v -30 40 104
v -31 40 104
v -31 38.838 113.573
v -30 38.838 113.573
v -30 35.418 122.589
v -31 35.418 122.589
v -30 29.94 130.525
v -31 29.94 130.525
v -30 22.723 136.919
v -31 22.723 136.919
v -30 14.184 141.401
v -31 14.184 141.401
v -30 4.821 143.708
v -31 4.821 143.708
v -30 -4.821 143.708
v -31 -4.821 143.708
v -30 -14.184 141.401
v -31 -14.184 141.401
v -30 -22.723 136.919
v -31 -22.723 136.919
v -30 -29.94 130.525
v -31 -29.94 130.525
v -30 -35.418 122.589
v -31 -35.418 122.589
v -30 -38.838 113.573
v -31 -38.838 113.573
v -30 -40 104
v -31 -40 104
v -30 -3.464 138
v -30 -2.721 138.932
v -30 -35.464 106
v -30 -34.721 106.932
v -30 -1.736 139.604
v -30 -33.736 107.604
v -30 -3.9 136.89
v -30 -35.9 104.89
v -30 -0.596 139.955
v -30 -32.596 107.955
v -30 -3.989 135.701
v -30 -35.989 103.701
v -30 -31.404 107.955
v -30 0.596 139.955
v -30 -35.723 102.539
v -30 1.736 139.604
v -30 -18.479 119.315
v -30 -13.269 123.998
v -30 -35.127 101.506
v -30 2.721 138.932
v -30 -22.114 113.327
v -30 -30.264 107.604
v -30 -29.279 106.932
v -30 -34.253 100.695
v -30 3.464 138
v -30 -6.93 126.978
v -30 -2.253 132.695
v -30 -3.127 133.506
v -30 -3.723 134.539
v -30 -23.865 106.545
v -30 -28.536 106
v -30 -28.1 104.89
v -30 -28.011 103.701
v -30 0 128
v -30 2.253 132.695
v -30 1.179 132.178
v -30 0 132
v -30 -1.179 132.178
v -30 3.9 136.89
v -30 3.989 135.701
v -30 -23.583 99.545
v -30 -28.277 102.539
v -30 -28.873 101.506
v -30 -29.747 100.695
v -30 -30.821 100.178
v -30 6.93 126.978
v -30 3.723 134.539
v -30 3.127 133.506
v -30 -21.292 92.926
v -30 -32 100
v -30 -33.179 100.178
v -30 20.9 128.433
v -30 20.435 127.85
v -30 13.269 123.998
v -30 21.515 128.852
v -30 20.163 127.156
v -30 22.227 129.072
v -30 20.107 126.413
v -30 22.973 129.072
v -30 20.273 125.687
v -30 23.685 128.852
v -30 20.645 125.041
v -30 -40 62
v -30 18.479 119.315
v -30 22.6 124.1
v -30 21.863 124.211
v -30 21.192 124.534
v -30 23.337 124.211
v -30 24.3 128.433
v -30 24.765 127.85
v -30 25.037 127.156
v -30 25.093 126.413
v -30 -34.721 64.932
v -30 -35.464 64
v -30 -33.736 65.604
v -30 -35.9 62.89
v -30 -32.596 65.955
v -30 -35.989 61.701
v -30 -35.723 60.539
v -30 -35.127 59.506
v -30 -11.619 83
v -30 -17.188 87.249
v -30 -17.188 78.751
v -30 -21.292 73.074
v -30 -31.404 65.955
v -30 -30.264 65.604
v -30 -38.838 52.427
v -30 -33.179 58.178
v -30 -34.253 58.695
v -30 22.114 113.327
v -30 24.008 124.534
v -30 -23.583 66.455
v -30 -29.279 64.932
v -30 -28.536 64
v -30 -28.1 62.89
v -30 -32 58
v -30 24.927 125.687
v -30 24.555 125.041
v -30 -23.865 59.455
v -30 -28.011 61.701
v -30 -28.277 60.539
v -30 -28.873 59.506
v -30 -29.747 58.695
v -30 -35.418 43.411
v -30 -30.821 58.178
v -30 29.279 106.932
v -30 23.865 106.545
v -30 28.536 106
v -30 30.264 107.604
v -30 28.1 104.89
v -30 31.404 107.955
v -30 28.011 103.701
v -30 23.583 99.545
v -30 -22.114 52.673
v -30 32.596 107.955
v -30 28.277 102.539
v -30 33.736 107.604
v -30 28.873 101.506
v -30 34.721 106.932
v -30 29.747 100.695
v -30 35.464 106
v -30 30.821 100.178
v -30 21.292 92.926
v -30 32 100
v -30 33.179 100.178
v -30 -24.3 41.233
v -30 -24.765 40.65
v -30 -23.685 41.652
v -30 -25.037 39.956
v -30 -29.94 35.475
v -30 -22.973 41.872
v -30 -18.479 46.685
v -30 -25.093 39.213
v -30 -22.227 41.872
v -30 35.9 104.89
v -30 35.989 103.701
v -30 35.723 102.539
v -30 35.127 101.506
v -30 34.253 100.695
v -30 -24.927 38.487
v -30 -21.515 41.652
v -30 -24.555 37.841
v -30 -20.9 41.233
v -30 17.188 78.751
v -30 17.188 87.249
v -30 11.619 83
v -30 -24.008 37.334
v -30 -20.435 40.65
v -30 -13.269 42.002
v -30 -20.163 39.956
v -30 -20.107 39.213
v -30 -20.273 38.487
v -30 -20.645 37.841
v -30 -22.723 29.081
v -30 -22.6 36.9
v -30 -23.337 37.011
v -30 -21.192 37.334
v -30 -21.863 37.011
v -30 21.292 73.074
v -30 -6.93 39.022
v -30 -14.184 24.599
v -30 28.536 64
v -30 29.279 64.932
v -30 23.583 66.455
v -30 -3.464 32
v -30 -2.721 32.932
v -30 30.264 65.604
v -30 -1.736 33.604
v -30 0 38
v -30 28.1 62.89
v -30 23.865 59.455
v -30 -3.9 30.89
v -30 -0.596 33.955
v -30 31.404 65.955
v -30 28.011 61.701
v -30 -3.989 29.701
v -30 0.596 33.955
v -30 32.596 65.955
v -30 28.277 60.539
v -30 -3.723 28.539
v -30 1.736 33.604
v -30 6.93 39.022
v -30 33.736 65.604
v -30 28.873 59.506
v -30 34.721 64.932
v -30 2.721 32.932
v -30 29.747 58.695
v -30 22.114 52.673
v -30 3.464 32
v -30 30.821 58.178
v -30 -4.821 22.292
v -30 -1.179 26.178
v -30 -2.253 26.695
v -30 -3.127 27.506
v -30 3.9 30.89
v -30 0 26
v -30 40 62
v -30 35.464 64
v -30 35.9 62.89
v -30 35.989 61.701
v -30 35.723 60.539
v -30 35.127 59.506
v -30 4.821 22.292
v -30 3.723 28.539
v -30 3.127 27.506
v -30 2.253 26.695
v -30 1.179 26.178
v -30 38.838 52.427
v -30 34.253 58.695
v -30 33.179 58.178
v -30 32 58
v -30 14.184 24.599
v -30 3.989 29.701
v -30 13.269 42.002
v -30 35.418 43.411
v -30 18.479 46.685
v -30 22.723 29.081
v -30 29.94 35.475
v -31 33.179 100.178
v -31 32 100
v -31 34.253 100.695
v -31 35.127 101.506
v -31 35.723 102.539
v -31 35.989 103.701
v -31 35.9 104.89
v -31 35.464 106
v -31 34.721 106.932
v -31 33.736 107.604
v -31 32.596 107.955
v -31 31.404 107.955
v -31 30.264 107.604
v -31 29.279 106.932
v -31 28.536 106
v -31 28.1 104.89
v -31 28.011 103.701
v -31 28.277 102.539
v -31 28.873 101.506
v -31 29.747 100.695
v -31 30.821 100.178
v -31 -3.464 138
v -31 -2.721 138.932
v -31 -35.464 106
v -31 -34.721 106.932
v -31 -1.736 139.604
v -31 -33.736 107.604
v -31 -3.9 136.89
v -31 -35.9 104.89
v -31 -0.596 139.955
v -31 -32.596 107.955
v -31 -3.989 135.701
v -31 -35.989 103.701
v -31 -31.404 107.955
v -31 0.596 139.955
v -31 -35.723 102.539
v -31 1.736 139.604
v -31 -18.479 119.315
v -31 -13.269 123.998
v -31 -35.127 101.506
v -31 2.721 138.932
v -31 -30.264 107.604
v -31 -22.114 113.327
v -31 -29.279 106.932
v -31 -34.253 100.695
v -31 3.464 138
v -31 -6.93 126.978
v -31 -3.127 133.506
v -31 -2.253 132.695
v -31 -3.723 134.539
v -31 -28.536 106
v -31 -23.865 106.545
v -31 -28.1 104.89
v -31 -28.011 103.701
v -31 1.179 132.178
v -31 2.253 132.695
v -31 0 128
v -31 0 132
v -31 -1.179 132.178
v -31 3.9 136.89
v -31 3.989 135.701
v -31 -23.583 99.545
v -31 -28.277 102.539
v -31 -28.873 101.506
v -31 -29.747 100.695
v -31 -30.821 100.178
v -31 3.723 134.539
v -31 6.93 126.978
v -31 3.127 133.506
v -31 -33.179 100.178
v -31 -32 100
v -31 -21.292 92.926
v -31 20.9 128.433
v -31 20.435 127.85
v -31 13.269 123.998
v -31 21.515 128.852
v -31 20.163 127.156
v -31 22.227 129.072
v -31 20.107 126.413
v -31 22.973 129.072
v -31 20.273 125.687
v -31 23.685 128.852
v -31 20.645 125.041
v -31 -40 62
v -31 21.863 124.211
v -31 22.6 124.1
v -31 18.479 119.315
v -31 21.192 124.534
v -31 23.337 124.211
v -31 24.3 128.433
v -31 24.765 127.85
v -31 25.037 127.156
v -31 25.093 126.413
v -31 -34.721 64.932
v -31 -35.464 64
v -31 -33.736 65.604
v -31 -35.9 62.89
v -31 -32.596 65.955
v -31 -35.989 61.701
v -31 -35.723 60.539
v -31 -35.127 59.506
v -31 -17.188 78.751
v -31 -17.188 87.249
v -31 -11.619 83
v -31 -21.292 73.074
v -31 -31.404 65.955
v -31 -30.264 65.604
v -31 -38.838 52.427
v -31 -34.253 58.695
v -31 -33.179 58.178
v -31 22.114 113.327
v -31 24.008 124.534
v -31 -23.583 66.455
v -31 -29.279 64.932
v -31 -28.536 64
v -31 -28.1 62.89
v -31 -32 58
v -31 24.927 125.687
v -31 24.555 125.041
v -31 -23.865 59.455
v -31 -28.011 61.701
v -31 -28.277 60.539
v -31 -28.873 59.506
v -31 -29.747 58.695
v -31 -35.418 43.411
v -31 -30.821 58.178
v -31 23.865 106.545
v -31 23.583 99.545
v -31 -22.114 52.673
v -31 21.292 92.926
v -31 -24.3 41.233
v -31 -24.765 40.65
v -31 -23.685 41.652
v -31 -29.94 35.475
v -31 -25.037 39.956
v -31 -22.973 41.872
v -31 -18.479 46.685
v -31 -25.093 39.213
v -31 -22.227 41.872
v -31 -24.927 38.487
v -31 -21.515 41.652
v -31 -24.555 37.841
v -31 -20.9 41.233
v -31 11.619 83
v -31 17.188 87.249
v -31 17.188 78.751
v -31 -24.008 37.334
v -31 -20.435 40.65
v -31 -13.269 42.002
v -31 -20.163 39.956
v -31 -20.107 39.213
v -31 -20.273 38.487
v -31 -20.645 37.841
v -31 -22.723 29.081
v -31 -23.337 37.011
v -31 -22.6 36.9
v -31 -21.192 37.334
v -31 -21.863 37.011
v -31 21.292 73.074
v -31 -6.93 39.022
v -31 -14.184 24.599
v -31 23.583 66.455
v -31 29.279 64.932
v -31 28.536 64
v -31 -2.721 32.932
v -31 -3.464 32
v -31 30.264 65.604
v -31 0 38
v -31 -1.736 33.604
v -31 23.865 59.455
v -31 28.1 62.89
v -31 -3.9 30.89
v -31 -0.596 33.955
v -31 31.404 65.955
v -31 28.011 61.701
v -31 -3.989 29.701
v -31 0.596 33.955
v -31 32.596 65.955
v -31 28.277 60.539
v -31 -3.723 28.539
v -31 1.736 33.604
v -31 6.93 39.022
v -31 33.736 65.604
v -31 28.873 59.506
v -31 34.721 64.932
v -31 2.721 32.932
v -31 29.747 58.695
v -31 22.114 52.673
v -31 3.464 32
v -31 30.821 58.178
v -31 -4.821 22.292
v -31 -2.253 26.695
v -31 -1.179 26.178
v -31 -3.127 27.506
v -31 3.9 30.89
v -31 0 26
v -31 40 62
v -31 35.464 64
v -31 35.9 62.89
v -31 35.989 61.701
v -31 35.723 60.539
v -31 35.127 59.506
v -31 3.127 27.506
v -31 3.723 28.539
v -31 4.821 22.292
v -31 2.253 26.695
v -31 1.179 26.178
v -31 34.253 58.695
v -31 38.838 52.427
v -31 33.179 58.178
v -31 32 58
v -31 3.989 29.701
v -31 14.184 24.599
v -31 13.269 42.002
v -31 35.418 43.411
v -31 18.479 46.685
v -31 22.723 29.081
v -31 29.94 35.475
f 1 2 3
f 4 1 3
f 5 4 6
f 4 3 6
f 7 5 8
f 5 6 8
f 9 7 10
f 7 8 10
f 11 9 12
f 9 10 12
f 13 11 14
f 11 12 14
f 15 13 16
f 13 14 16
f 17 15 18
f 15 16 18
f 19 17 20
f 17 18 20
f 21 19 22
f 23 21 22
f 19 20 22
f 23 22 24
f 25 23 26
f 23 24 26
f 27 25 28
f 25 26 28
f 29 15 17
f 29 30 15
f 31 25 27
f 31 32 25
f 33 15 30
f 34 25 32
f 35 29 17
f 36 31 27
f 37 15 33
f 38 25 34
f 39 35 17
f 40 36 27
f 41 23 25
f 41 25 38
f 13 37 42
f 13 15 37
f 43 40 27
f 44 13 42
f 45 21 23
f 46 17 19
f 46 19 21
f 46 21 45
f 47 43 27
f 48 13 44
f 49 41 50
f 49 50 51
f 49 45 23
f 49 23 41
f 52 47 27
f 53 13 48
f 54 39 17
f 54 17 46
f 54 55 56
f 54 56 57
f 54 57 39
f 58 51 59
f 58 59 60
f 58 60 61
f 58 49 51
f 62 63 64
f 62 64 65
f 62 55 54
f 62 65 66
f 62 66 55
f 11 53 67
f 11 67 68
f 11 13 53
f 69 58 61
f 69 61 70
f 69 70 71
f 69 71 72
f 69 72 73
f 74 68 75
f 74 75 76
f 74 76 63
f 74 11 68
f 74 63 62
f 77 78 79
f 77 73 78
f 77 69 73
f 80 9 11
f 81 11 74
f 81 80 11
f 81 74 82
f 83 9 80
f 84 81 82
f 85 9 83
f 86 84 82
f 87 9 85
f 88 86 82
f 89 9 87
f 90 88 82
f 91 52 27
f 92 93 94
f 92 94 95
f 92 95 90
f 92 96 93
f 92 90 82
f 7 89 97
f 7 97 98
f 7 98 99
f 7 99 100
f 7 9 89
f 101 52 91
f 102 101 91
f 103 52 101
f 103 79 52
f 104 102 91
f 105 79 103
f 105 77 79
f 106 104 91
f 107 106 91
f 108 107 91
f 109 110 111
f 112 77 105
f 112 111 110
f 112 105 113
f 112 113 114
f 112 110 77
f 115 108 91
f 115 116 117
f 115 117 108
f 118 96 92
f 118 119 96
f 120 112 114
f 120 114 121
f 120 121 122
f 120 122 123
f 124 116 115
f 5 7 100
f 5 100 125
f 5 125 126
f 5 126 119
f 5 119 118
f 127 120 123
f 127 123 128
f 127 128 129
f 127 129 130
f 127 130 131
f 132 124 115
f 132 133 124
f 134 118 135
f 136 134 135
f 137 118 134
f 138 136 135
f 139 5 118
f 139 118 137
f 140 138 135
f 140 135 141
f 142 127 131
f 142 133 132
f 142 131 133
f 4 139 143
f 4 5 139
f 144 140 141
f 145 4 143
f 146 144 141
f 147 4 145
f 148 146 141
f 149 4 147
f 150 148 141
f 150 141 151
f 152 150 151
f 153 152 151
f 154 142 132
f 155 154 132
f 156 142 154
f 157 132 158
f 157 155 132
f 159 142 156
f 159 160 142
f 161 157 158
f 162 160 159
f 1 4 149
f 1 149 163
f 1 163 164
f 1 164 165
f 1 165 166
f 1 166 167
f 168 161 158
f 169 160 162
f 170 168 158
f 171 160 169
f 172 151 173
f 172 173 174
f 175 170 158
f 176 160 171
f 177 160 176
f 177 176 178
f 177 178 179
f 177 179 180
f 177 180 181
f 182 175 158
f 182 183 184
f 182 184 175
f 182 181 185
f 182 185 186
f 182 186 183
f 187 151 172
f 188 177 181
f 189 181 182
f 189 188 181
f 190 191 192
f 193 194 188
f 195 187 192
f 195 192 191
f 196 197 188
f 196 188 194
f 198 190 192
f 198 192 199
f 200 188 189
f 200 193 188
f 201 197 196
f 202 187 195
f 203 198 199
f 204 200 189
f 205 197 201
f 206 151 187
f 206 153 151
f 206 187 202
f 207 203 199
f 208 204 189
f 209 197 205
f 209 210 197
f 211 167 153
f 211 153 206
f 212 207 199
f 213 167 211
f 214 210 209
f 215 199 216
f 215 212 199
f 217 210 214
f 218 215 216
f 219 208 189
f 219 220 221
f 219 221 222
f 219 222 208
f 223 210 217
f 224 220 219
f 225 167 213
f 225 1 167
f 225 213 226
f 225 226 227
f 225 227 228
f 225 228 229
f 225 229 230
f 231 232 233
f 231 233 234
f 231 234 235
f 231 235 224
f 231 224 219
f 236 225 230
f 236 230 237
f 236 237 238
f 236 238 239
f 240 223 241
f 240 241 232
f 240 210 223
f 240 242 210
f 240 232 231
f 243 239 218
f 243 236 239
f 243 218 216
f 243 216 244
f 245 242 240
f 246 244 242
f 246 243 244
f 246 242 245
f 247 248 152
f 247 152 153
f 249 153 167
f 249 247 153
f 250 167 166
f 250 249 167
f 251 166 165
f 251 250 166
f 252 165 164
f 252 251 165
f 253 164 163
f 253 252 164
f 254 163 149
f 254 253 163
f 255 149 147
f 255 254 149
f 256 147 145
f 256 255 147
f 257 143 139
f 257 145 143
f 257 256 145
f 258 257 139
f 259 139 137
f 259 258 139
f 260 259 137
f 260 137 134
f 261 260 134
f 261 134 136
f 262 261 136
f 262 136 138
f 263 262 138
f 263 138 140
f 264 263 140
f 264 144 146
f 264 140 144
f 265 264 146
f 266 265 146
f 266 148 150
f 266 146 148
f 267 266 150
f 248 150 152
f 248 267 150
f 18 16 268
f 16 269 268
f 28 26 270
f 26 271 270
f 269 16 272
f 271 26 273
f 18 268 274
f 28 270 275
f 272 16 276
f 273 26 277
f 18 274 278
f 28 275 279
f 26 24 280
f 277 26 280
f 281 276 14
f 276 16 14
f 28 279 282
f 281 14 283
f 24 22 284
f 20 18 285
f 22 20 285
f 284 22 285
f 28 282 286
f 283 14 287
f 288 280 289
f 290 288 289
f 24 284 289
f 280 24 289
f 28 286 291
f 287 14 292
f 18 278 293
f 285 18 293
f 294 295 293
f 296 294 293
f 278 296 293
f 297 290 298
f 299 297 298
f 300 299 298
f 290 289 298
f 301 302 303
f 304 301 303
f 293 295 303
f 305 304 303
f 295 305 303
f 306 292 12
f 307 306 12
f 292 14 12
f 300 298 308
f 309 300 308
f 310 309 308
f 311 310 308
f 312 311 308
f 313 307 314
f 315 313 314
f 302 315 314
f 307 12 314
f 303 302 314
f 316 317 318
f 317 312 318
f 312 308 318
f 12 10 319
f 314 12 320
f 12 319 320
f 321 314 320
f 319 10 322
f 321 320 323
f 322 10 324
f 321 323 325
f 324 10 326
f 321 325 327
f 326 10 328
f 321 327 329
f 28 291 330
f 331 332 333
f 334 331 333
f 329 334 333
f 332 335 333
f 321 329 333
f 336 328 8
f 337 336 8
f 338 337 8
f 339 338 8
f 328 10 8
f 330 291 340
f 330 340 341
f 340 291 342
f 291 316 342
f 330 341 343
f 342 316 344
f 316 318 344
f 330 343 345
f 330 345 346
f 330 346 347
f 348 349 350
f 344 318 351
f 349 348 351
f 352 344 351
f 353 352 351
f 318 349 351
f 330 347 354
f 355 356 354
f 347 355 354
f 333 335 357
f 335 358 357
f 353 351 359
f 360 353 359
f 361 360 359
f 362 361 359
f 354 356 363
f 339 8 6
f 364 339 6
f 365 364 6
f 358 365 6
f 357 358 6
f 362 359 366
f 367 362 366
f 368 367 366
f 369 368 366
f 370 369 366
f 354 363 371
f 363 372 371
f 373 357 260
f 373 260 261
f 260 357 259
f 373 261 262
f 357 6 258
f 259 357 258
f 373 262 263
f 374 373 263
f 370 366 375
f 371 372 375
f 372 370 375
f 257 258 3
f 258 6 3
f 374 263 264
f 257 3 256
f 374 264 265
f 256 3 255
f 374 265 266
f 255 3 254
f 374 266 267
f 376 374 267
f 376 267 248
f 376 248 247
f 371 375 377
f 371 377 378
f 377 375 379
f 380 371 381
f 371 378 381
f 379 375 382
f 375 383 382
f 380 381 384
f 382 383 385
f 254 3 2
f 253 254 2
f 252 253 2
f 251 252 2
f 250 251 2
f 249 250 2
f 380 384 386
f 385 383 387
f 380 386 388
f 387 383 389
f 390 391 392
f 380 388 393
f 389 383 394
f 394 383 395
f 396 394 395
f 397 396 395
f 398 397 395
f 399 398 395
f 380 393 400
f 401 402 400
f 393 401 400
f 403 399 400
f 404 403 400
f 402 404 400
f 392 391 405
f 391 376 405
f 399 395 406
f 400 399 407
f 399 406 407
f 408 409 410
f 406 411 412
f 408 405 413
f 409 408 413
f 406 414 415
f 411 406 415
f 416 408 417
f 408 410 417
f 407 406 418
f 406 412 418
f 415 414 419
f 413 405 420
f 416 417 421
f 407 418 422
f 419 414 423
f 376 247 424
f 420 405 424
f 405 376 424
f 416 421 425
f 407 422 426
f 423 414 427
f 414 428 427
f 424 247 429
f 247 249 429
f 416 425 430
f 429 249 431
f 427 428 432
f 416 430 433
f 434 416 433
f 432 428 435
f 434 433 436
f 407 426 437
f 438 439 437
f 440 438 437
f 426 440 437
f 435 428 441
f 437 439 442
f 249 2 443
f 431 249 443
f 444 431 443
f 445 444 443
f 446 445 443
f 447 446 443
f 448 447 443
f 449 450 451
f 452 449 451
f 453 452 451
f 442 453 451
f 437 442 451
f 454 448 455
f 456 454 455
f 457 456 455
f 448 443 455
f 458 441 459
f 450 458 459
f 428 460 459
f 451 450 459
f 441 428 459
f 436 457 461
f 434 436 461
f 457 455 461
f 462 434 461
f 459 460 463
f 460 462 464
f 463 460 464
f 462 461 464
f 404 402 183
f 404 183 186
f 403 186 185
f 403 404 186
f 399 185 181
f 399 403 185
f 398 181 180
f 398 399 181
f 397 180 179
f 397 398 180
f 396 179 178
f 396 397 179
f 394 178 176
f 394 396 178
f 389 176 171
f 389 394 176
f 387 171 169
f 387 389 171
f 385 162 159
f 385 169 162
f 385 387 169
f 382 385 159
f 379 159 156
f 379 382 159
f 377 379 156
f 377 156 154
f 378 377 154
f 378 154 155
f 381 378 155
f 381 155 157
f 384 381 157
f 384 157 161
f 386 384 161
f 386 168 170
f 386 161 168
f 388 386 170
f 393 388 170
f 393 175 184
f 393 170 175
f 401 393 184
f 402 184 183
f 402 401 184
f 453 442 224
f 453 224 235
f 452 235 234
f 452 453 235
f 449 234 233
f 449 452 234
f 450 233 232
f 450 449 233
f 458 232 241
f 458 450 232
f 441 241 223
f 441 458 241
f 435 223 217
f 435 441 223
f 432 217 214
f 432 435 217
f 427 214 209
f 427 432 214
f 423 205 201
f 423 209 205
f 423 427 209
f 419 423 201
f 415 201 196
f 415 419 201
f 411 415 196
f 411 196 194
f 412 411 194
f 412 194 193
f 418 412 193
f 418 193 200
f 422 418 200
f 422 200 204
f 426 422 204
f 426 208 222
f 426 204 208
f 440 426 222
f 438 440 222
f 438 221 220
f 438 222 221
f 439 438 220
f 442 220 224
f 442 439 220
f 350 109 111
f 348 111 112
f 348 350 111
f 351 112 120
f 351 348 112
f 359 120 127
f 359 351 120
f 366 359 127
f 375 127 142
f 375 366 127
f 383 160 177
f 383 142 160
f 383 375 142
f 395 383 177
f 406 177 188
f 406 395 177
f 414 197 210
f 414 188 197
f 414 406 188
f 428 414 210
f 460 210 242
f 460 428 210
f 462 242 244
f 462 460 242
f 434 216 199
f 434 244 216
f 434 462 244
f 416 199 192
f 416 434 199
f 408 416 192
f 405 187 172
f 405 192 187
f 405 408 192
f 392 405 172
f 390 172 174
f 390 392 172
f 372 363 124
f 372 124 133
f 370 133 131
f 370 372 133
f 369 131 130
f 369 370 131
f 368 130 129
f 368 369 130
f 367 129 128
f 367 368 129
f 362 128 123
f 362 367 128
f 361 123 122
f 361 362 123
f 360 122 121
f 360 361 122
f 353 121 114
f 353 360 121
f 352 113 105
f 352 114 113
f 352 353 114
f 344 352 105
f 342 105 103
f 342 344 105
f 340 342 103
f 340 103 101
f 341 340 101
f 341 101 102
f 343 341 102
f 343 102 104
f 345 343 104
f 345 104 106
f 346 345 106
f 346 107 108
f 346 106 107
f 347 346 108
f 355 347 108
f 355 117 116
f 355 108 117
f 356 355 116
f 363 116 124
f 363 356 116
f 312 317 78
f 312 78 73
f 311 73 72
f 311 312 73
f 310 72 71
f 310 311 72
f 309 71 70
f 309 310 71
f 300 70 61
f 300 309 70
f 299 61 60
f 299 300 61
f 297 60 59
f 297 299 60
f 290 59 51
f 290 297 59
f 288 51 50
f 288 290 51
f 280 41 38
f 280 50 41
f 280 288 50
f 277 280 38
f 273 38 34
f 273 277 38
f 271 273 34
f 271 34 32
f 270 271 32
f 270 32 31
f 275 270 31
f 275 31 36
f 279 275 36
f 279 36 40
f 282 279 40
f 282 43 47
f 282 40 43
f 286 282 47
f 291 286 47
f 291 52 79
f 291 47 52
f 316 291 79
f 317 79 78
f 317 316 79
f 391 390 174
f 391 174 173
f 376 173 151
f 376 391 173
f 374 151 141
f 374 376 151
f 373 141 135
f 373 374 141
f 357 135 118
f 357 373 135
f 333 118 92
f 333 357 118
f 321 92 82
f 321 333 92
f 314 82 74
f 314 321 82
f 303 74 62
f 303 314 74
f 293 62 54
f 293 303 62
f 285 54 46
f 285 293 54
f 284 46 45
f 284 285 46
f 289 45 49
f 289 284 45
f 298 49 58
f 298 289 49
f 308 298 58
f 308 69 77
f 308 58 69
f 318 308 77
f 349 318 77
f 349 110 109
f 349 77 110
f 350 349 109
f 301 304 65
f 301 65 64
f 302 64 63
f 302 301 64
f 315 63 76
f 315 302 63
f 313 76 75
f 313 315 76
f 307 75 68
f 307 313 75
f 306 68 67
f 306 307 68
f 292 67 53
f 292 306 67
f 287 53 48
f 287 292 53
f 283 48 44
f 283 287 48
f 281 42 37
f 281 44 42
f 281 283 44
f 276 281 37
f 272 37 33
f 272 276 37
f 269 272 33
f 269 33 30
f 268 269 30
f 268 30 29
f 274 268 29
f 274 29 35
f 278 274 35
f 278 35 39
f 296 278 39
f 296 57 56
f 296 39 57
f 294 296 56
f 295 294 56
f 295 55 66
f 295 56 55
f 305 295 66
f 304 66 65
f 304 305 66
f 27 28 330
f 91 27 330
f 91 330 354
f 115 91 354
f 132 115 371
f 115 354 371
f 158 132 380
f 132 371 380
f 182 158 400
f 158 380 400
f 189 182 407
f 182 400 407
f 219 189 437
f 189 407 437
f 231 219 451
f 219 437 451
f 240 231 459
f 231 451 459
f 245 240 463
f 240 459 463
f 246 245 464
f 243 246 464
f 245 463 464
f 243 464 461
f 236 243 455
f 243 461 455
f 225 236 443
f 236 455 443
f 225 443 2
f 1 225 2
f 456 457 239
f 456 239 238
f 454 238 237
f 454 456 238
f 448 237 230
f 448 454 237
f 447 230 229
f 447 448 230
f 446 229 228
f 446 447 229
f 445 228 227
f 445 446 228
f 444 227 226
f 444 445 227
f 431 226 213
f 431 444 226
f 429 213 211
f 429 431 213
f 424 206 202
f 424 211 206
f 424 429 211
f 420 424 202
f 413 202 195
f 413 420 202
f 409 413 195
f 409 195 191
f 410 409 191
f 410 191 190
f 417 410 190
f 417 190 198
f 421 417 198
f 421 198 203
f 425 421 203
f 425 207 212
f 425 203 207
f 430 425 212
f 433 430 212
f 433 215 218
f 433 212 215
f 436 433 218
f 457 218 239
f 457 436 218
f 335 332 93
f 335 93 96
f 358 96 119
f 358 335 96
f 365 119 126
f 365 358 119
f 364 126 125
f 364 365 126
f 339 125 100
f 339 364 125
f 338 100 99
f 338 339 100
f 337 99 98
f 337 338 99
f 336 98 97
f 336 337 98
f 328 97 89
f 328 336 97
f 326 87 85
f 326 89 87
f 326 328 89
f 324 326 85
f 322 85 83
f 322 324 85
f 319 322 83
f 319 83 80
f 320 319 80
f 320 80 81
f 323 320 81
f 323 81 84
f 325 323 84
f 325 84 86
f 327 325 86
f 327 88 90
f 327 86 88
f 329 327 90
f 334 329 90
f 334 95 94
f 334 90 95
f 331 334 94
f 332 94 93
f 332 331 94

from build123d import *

# Parameters (mm, degrees)
F_01_GASKET_DEPTH  = 1
SKETCH_2_R         = 24
F_02_HOLE_UP_DEPTH = 3
SKETCH_3_R         = 24
F_03_HOLE_LO_DEPTH = 3
SKETCH_4_R         = 4
F_04_BOLT_0_DEPTH  = 3
SKETCH_5_R         = 4
F_04_BOLT_1_DEPTH  = 3
SKETCH_6_R         = 4
F_04_BOLT_2_DEPTH  = 3
SKETCH_7_R         = 4
F_04_BOLT_3_DEPTH  = 3
SKETCH_8_R         = 4
F_04_BOLT_4_DEPTH  = 3
SKETCH_9_R         = 4
F_04_BOLT_5_DEPTH  = 3
SKETCH_10_R        = 2.5
F_05_DOWEL_0_DEPTH = 3
SKETCH_11_R        = 2.5
F_05_DOWEL_1_DEPTH = 3


with BuildPart() as part:
    # 草图1 → 01_GASKET (new body)
    with BuildSketch(Plane(origin=(-31, 0, 0), x_dir=(0, 0, -1), z_dir=(1, 0, 0))):
        with BuildLine():
            Line((-104, -40), (-62, -40))
            ThreePointArc((-62, -40), (-22, 0), (-62, 40))
            Line((-62, 40), (-104, 40))
            ThreePointArc((-104, 40), (-144, 0), (-104, -40))
        make_face()
    extrude(amount=F_01_GASKET_DEPTH)

    # 草图2 → 02_HOLE_UP (cut)
    with BuildSketch(Plane(origin=(-32, 0, 0), x_dir=(0, 0, -1), z_dir=(1, 0, 0))):
        with Locations((-104, 0)):
            Circle(SKETCH_2_R)
    extrude(amount=F_02_HOLE_UP_DEPTH, mode=Mode.SUBTRACT)

    # 草图3 → 03_HOLE_LO (cut)
    with BuildSketch(Plane(origin=(-32, 0, 0), x_dir=(0, 0, -1), z_dir=(1, 0, 0))):
        with Locations((-62, 0)):
            Circle(SKETCH_3_R)
    extrude(amount=F_03_HOLE_LO_DEPTH, mode=Mode.SUBTRACT)

    # 草图4 → 04_BOLT_0 (cut)
    with BuildSketch(Plane(origin=(-32, 0, 0), x_dir=(0, 0, -1), z_dir=(1, 0, 0))):
        with Locations((-104, 32)):
            Circle(SKETCH_4_R)
    extrude(amount=F_04_BOLT_0_DEPTH, mode=Mode.SUBTRACT)

    # 草图5 → 04_BOLT_1 (cut)
    with BuildSketch(Plane(origin=(-32, 0, 0), x_dir=(0, 0, -1), z_dir=(1, 0, 0))):
        with Locations((-104, -32)):
            Circle(SKETCH_5_R)
    extrude(amount=F_04_BOLT_1_DEPTH, mode=Mode.SUBTRACT)

    # 草图6 → 04_BOLT_2 (cut)
    with BuildSketch(Plane(origin=(-32, 0, 0), x_dir=(0, 0, -1), z_dir=(1, 0, 0))):
        with Locations((-62, 32)):
            Circle(SKETCH_6_R)
    extrude(amount=F_04_BOLT_2_DEPTH, mode=Mode.SUBTRACT)

    # 草图7 → 04_BOLT_3 (cut)
    with BuildSketch(Plane(origin=(-32, 0, 0), x_dir=(0, 0, -1), z_dir=(1, 0, 0))):
        with Locations((-62, -32)):
            Circle(SKETCH_7_R)
    extrude(amount=F_04_BOLT_3_DEPTH, mode=Mode.SUBTRACT)

    # 草图8 → 04_BOLT_4 (cut)
    with BuildSketch(Plane(origin=(-32, 0, 0), x_dir=(0, 0, -1), z_dir=(1, 0, 0))):
        with Locations((-136, 0)):
            Circle(SKETCH_8_R)
    extrude(amount=F_04_BOLT_4_DEPTH, mode=Mode.SUBTRACT)

    # 草图9 → 04_BOLT_5 (cut)
    with BuildSketch(Plane(origin=(-32, 0, 0), x_dir=(0, 0, -1), z_dir=(1, 0, 0))):
        with Locations((-30, 0)):
            Circle(SKETCH_9_R)
    extrude(amount=F_04_BOLT_5_DEPTH, mode=Mode.SUBTRACT)

    # 草图10 → 05_DOWEL_0 (cut)
    with BuildSketch(Plane(origin=(-32, 0, 0), x_dir=(0, 0, -1), z_dir=(1, 0, 0))):
        with Locations((-126.6, 22.6)):
            Circle(SKETCH_10_R)
    extrude(amount=F_05_DOWEL_0_DEPTH, mode=Mode.SUBTRACT)

    # 草图11 → 05_DOWEL_1 (cut)
    with BuildSketch(Plane(origin=(-32, 0, 0), x_dir=(0, 0, -1), z_dir=(1, 0, 0))):
        with Locations((-39.4, -22.6)):
            Circle(SKETCH_11_R)
    extrude(amount=F_05_DOWEL_1_DEPTH, mode=Mode.SUBTRACT)


solid = part.part
